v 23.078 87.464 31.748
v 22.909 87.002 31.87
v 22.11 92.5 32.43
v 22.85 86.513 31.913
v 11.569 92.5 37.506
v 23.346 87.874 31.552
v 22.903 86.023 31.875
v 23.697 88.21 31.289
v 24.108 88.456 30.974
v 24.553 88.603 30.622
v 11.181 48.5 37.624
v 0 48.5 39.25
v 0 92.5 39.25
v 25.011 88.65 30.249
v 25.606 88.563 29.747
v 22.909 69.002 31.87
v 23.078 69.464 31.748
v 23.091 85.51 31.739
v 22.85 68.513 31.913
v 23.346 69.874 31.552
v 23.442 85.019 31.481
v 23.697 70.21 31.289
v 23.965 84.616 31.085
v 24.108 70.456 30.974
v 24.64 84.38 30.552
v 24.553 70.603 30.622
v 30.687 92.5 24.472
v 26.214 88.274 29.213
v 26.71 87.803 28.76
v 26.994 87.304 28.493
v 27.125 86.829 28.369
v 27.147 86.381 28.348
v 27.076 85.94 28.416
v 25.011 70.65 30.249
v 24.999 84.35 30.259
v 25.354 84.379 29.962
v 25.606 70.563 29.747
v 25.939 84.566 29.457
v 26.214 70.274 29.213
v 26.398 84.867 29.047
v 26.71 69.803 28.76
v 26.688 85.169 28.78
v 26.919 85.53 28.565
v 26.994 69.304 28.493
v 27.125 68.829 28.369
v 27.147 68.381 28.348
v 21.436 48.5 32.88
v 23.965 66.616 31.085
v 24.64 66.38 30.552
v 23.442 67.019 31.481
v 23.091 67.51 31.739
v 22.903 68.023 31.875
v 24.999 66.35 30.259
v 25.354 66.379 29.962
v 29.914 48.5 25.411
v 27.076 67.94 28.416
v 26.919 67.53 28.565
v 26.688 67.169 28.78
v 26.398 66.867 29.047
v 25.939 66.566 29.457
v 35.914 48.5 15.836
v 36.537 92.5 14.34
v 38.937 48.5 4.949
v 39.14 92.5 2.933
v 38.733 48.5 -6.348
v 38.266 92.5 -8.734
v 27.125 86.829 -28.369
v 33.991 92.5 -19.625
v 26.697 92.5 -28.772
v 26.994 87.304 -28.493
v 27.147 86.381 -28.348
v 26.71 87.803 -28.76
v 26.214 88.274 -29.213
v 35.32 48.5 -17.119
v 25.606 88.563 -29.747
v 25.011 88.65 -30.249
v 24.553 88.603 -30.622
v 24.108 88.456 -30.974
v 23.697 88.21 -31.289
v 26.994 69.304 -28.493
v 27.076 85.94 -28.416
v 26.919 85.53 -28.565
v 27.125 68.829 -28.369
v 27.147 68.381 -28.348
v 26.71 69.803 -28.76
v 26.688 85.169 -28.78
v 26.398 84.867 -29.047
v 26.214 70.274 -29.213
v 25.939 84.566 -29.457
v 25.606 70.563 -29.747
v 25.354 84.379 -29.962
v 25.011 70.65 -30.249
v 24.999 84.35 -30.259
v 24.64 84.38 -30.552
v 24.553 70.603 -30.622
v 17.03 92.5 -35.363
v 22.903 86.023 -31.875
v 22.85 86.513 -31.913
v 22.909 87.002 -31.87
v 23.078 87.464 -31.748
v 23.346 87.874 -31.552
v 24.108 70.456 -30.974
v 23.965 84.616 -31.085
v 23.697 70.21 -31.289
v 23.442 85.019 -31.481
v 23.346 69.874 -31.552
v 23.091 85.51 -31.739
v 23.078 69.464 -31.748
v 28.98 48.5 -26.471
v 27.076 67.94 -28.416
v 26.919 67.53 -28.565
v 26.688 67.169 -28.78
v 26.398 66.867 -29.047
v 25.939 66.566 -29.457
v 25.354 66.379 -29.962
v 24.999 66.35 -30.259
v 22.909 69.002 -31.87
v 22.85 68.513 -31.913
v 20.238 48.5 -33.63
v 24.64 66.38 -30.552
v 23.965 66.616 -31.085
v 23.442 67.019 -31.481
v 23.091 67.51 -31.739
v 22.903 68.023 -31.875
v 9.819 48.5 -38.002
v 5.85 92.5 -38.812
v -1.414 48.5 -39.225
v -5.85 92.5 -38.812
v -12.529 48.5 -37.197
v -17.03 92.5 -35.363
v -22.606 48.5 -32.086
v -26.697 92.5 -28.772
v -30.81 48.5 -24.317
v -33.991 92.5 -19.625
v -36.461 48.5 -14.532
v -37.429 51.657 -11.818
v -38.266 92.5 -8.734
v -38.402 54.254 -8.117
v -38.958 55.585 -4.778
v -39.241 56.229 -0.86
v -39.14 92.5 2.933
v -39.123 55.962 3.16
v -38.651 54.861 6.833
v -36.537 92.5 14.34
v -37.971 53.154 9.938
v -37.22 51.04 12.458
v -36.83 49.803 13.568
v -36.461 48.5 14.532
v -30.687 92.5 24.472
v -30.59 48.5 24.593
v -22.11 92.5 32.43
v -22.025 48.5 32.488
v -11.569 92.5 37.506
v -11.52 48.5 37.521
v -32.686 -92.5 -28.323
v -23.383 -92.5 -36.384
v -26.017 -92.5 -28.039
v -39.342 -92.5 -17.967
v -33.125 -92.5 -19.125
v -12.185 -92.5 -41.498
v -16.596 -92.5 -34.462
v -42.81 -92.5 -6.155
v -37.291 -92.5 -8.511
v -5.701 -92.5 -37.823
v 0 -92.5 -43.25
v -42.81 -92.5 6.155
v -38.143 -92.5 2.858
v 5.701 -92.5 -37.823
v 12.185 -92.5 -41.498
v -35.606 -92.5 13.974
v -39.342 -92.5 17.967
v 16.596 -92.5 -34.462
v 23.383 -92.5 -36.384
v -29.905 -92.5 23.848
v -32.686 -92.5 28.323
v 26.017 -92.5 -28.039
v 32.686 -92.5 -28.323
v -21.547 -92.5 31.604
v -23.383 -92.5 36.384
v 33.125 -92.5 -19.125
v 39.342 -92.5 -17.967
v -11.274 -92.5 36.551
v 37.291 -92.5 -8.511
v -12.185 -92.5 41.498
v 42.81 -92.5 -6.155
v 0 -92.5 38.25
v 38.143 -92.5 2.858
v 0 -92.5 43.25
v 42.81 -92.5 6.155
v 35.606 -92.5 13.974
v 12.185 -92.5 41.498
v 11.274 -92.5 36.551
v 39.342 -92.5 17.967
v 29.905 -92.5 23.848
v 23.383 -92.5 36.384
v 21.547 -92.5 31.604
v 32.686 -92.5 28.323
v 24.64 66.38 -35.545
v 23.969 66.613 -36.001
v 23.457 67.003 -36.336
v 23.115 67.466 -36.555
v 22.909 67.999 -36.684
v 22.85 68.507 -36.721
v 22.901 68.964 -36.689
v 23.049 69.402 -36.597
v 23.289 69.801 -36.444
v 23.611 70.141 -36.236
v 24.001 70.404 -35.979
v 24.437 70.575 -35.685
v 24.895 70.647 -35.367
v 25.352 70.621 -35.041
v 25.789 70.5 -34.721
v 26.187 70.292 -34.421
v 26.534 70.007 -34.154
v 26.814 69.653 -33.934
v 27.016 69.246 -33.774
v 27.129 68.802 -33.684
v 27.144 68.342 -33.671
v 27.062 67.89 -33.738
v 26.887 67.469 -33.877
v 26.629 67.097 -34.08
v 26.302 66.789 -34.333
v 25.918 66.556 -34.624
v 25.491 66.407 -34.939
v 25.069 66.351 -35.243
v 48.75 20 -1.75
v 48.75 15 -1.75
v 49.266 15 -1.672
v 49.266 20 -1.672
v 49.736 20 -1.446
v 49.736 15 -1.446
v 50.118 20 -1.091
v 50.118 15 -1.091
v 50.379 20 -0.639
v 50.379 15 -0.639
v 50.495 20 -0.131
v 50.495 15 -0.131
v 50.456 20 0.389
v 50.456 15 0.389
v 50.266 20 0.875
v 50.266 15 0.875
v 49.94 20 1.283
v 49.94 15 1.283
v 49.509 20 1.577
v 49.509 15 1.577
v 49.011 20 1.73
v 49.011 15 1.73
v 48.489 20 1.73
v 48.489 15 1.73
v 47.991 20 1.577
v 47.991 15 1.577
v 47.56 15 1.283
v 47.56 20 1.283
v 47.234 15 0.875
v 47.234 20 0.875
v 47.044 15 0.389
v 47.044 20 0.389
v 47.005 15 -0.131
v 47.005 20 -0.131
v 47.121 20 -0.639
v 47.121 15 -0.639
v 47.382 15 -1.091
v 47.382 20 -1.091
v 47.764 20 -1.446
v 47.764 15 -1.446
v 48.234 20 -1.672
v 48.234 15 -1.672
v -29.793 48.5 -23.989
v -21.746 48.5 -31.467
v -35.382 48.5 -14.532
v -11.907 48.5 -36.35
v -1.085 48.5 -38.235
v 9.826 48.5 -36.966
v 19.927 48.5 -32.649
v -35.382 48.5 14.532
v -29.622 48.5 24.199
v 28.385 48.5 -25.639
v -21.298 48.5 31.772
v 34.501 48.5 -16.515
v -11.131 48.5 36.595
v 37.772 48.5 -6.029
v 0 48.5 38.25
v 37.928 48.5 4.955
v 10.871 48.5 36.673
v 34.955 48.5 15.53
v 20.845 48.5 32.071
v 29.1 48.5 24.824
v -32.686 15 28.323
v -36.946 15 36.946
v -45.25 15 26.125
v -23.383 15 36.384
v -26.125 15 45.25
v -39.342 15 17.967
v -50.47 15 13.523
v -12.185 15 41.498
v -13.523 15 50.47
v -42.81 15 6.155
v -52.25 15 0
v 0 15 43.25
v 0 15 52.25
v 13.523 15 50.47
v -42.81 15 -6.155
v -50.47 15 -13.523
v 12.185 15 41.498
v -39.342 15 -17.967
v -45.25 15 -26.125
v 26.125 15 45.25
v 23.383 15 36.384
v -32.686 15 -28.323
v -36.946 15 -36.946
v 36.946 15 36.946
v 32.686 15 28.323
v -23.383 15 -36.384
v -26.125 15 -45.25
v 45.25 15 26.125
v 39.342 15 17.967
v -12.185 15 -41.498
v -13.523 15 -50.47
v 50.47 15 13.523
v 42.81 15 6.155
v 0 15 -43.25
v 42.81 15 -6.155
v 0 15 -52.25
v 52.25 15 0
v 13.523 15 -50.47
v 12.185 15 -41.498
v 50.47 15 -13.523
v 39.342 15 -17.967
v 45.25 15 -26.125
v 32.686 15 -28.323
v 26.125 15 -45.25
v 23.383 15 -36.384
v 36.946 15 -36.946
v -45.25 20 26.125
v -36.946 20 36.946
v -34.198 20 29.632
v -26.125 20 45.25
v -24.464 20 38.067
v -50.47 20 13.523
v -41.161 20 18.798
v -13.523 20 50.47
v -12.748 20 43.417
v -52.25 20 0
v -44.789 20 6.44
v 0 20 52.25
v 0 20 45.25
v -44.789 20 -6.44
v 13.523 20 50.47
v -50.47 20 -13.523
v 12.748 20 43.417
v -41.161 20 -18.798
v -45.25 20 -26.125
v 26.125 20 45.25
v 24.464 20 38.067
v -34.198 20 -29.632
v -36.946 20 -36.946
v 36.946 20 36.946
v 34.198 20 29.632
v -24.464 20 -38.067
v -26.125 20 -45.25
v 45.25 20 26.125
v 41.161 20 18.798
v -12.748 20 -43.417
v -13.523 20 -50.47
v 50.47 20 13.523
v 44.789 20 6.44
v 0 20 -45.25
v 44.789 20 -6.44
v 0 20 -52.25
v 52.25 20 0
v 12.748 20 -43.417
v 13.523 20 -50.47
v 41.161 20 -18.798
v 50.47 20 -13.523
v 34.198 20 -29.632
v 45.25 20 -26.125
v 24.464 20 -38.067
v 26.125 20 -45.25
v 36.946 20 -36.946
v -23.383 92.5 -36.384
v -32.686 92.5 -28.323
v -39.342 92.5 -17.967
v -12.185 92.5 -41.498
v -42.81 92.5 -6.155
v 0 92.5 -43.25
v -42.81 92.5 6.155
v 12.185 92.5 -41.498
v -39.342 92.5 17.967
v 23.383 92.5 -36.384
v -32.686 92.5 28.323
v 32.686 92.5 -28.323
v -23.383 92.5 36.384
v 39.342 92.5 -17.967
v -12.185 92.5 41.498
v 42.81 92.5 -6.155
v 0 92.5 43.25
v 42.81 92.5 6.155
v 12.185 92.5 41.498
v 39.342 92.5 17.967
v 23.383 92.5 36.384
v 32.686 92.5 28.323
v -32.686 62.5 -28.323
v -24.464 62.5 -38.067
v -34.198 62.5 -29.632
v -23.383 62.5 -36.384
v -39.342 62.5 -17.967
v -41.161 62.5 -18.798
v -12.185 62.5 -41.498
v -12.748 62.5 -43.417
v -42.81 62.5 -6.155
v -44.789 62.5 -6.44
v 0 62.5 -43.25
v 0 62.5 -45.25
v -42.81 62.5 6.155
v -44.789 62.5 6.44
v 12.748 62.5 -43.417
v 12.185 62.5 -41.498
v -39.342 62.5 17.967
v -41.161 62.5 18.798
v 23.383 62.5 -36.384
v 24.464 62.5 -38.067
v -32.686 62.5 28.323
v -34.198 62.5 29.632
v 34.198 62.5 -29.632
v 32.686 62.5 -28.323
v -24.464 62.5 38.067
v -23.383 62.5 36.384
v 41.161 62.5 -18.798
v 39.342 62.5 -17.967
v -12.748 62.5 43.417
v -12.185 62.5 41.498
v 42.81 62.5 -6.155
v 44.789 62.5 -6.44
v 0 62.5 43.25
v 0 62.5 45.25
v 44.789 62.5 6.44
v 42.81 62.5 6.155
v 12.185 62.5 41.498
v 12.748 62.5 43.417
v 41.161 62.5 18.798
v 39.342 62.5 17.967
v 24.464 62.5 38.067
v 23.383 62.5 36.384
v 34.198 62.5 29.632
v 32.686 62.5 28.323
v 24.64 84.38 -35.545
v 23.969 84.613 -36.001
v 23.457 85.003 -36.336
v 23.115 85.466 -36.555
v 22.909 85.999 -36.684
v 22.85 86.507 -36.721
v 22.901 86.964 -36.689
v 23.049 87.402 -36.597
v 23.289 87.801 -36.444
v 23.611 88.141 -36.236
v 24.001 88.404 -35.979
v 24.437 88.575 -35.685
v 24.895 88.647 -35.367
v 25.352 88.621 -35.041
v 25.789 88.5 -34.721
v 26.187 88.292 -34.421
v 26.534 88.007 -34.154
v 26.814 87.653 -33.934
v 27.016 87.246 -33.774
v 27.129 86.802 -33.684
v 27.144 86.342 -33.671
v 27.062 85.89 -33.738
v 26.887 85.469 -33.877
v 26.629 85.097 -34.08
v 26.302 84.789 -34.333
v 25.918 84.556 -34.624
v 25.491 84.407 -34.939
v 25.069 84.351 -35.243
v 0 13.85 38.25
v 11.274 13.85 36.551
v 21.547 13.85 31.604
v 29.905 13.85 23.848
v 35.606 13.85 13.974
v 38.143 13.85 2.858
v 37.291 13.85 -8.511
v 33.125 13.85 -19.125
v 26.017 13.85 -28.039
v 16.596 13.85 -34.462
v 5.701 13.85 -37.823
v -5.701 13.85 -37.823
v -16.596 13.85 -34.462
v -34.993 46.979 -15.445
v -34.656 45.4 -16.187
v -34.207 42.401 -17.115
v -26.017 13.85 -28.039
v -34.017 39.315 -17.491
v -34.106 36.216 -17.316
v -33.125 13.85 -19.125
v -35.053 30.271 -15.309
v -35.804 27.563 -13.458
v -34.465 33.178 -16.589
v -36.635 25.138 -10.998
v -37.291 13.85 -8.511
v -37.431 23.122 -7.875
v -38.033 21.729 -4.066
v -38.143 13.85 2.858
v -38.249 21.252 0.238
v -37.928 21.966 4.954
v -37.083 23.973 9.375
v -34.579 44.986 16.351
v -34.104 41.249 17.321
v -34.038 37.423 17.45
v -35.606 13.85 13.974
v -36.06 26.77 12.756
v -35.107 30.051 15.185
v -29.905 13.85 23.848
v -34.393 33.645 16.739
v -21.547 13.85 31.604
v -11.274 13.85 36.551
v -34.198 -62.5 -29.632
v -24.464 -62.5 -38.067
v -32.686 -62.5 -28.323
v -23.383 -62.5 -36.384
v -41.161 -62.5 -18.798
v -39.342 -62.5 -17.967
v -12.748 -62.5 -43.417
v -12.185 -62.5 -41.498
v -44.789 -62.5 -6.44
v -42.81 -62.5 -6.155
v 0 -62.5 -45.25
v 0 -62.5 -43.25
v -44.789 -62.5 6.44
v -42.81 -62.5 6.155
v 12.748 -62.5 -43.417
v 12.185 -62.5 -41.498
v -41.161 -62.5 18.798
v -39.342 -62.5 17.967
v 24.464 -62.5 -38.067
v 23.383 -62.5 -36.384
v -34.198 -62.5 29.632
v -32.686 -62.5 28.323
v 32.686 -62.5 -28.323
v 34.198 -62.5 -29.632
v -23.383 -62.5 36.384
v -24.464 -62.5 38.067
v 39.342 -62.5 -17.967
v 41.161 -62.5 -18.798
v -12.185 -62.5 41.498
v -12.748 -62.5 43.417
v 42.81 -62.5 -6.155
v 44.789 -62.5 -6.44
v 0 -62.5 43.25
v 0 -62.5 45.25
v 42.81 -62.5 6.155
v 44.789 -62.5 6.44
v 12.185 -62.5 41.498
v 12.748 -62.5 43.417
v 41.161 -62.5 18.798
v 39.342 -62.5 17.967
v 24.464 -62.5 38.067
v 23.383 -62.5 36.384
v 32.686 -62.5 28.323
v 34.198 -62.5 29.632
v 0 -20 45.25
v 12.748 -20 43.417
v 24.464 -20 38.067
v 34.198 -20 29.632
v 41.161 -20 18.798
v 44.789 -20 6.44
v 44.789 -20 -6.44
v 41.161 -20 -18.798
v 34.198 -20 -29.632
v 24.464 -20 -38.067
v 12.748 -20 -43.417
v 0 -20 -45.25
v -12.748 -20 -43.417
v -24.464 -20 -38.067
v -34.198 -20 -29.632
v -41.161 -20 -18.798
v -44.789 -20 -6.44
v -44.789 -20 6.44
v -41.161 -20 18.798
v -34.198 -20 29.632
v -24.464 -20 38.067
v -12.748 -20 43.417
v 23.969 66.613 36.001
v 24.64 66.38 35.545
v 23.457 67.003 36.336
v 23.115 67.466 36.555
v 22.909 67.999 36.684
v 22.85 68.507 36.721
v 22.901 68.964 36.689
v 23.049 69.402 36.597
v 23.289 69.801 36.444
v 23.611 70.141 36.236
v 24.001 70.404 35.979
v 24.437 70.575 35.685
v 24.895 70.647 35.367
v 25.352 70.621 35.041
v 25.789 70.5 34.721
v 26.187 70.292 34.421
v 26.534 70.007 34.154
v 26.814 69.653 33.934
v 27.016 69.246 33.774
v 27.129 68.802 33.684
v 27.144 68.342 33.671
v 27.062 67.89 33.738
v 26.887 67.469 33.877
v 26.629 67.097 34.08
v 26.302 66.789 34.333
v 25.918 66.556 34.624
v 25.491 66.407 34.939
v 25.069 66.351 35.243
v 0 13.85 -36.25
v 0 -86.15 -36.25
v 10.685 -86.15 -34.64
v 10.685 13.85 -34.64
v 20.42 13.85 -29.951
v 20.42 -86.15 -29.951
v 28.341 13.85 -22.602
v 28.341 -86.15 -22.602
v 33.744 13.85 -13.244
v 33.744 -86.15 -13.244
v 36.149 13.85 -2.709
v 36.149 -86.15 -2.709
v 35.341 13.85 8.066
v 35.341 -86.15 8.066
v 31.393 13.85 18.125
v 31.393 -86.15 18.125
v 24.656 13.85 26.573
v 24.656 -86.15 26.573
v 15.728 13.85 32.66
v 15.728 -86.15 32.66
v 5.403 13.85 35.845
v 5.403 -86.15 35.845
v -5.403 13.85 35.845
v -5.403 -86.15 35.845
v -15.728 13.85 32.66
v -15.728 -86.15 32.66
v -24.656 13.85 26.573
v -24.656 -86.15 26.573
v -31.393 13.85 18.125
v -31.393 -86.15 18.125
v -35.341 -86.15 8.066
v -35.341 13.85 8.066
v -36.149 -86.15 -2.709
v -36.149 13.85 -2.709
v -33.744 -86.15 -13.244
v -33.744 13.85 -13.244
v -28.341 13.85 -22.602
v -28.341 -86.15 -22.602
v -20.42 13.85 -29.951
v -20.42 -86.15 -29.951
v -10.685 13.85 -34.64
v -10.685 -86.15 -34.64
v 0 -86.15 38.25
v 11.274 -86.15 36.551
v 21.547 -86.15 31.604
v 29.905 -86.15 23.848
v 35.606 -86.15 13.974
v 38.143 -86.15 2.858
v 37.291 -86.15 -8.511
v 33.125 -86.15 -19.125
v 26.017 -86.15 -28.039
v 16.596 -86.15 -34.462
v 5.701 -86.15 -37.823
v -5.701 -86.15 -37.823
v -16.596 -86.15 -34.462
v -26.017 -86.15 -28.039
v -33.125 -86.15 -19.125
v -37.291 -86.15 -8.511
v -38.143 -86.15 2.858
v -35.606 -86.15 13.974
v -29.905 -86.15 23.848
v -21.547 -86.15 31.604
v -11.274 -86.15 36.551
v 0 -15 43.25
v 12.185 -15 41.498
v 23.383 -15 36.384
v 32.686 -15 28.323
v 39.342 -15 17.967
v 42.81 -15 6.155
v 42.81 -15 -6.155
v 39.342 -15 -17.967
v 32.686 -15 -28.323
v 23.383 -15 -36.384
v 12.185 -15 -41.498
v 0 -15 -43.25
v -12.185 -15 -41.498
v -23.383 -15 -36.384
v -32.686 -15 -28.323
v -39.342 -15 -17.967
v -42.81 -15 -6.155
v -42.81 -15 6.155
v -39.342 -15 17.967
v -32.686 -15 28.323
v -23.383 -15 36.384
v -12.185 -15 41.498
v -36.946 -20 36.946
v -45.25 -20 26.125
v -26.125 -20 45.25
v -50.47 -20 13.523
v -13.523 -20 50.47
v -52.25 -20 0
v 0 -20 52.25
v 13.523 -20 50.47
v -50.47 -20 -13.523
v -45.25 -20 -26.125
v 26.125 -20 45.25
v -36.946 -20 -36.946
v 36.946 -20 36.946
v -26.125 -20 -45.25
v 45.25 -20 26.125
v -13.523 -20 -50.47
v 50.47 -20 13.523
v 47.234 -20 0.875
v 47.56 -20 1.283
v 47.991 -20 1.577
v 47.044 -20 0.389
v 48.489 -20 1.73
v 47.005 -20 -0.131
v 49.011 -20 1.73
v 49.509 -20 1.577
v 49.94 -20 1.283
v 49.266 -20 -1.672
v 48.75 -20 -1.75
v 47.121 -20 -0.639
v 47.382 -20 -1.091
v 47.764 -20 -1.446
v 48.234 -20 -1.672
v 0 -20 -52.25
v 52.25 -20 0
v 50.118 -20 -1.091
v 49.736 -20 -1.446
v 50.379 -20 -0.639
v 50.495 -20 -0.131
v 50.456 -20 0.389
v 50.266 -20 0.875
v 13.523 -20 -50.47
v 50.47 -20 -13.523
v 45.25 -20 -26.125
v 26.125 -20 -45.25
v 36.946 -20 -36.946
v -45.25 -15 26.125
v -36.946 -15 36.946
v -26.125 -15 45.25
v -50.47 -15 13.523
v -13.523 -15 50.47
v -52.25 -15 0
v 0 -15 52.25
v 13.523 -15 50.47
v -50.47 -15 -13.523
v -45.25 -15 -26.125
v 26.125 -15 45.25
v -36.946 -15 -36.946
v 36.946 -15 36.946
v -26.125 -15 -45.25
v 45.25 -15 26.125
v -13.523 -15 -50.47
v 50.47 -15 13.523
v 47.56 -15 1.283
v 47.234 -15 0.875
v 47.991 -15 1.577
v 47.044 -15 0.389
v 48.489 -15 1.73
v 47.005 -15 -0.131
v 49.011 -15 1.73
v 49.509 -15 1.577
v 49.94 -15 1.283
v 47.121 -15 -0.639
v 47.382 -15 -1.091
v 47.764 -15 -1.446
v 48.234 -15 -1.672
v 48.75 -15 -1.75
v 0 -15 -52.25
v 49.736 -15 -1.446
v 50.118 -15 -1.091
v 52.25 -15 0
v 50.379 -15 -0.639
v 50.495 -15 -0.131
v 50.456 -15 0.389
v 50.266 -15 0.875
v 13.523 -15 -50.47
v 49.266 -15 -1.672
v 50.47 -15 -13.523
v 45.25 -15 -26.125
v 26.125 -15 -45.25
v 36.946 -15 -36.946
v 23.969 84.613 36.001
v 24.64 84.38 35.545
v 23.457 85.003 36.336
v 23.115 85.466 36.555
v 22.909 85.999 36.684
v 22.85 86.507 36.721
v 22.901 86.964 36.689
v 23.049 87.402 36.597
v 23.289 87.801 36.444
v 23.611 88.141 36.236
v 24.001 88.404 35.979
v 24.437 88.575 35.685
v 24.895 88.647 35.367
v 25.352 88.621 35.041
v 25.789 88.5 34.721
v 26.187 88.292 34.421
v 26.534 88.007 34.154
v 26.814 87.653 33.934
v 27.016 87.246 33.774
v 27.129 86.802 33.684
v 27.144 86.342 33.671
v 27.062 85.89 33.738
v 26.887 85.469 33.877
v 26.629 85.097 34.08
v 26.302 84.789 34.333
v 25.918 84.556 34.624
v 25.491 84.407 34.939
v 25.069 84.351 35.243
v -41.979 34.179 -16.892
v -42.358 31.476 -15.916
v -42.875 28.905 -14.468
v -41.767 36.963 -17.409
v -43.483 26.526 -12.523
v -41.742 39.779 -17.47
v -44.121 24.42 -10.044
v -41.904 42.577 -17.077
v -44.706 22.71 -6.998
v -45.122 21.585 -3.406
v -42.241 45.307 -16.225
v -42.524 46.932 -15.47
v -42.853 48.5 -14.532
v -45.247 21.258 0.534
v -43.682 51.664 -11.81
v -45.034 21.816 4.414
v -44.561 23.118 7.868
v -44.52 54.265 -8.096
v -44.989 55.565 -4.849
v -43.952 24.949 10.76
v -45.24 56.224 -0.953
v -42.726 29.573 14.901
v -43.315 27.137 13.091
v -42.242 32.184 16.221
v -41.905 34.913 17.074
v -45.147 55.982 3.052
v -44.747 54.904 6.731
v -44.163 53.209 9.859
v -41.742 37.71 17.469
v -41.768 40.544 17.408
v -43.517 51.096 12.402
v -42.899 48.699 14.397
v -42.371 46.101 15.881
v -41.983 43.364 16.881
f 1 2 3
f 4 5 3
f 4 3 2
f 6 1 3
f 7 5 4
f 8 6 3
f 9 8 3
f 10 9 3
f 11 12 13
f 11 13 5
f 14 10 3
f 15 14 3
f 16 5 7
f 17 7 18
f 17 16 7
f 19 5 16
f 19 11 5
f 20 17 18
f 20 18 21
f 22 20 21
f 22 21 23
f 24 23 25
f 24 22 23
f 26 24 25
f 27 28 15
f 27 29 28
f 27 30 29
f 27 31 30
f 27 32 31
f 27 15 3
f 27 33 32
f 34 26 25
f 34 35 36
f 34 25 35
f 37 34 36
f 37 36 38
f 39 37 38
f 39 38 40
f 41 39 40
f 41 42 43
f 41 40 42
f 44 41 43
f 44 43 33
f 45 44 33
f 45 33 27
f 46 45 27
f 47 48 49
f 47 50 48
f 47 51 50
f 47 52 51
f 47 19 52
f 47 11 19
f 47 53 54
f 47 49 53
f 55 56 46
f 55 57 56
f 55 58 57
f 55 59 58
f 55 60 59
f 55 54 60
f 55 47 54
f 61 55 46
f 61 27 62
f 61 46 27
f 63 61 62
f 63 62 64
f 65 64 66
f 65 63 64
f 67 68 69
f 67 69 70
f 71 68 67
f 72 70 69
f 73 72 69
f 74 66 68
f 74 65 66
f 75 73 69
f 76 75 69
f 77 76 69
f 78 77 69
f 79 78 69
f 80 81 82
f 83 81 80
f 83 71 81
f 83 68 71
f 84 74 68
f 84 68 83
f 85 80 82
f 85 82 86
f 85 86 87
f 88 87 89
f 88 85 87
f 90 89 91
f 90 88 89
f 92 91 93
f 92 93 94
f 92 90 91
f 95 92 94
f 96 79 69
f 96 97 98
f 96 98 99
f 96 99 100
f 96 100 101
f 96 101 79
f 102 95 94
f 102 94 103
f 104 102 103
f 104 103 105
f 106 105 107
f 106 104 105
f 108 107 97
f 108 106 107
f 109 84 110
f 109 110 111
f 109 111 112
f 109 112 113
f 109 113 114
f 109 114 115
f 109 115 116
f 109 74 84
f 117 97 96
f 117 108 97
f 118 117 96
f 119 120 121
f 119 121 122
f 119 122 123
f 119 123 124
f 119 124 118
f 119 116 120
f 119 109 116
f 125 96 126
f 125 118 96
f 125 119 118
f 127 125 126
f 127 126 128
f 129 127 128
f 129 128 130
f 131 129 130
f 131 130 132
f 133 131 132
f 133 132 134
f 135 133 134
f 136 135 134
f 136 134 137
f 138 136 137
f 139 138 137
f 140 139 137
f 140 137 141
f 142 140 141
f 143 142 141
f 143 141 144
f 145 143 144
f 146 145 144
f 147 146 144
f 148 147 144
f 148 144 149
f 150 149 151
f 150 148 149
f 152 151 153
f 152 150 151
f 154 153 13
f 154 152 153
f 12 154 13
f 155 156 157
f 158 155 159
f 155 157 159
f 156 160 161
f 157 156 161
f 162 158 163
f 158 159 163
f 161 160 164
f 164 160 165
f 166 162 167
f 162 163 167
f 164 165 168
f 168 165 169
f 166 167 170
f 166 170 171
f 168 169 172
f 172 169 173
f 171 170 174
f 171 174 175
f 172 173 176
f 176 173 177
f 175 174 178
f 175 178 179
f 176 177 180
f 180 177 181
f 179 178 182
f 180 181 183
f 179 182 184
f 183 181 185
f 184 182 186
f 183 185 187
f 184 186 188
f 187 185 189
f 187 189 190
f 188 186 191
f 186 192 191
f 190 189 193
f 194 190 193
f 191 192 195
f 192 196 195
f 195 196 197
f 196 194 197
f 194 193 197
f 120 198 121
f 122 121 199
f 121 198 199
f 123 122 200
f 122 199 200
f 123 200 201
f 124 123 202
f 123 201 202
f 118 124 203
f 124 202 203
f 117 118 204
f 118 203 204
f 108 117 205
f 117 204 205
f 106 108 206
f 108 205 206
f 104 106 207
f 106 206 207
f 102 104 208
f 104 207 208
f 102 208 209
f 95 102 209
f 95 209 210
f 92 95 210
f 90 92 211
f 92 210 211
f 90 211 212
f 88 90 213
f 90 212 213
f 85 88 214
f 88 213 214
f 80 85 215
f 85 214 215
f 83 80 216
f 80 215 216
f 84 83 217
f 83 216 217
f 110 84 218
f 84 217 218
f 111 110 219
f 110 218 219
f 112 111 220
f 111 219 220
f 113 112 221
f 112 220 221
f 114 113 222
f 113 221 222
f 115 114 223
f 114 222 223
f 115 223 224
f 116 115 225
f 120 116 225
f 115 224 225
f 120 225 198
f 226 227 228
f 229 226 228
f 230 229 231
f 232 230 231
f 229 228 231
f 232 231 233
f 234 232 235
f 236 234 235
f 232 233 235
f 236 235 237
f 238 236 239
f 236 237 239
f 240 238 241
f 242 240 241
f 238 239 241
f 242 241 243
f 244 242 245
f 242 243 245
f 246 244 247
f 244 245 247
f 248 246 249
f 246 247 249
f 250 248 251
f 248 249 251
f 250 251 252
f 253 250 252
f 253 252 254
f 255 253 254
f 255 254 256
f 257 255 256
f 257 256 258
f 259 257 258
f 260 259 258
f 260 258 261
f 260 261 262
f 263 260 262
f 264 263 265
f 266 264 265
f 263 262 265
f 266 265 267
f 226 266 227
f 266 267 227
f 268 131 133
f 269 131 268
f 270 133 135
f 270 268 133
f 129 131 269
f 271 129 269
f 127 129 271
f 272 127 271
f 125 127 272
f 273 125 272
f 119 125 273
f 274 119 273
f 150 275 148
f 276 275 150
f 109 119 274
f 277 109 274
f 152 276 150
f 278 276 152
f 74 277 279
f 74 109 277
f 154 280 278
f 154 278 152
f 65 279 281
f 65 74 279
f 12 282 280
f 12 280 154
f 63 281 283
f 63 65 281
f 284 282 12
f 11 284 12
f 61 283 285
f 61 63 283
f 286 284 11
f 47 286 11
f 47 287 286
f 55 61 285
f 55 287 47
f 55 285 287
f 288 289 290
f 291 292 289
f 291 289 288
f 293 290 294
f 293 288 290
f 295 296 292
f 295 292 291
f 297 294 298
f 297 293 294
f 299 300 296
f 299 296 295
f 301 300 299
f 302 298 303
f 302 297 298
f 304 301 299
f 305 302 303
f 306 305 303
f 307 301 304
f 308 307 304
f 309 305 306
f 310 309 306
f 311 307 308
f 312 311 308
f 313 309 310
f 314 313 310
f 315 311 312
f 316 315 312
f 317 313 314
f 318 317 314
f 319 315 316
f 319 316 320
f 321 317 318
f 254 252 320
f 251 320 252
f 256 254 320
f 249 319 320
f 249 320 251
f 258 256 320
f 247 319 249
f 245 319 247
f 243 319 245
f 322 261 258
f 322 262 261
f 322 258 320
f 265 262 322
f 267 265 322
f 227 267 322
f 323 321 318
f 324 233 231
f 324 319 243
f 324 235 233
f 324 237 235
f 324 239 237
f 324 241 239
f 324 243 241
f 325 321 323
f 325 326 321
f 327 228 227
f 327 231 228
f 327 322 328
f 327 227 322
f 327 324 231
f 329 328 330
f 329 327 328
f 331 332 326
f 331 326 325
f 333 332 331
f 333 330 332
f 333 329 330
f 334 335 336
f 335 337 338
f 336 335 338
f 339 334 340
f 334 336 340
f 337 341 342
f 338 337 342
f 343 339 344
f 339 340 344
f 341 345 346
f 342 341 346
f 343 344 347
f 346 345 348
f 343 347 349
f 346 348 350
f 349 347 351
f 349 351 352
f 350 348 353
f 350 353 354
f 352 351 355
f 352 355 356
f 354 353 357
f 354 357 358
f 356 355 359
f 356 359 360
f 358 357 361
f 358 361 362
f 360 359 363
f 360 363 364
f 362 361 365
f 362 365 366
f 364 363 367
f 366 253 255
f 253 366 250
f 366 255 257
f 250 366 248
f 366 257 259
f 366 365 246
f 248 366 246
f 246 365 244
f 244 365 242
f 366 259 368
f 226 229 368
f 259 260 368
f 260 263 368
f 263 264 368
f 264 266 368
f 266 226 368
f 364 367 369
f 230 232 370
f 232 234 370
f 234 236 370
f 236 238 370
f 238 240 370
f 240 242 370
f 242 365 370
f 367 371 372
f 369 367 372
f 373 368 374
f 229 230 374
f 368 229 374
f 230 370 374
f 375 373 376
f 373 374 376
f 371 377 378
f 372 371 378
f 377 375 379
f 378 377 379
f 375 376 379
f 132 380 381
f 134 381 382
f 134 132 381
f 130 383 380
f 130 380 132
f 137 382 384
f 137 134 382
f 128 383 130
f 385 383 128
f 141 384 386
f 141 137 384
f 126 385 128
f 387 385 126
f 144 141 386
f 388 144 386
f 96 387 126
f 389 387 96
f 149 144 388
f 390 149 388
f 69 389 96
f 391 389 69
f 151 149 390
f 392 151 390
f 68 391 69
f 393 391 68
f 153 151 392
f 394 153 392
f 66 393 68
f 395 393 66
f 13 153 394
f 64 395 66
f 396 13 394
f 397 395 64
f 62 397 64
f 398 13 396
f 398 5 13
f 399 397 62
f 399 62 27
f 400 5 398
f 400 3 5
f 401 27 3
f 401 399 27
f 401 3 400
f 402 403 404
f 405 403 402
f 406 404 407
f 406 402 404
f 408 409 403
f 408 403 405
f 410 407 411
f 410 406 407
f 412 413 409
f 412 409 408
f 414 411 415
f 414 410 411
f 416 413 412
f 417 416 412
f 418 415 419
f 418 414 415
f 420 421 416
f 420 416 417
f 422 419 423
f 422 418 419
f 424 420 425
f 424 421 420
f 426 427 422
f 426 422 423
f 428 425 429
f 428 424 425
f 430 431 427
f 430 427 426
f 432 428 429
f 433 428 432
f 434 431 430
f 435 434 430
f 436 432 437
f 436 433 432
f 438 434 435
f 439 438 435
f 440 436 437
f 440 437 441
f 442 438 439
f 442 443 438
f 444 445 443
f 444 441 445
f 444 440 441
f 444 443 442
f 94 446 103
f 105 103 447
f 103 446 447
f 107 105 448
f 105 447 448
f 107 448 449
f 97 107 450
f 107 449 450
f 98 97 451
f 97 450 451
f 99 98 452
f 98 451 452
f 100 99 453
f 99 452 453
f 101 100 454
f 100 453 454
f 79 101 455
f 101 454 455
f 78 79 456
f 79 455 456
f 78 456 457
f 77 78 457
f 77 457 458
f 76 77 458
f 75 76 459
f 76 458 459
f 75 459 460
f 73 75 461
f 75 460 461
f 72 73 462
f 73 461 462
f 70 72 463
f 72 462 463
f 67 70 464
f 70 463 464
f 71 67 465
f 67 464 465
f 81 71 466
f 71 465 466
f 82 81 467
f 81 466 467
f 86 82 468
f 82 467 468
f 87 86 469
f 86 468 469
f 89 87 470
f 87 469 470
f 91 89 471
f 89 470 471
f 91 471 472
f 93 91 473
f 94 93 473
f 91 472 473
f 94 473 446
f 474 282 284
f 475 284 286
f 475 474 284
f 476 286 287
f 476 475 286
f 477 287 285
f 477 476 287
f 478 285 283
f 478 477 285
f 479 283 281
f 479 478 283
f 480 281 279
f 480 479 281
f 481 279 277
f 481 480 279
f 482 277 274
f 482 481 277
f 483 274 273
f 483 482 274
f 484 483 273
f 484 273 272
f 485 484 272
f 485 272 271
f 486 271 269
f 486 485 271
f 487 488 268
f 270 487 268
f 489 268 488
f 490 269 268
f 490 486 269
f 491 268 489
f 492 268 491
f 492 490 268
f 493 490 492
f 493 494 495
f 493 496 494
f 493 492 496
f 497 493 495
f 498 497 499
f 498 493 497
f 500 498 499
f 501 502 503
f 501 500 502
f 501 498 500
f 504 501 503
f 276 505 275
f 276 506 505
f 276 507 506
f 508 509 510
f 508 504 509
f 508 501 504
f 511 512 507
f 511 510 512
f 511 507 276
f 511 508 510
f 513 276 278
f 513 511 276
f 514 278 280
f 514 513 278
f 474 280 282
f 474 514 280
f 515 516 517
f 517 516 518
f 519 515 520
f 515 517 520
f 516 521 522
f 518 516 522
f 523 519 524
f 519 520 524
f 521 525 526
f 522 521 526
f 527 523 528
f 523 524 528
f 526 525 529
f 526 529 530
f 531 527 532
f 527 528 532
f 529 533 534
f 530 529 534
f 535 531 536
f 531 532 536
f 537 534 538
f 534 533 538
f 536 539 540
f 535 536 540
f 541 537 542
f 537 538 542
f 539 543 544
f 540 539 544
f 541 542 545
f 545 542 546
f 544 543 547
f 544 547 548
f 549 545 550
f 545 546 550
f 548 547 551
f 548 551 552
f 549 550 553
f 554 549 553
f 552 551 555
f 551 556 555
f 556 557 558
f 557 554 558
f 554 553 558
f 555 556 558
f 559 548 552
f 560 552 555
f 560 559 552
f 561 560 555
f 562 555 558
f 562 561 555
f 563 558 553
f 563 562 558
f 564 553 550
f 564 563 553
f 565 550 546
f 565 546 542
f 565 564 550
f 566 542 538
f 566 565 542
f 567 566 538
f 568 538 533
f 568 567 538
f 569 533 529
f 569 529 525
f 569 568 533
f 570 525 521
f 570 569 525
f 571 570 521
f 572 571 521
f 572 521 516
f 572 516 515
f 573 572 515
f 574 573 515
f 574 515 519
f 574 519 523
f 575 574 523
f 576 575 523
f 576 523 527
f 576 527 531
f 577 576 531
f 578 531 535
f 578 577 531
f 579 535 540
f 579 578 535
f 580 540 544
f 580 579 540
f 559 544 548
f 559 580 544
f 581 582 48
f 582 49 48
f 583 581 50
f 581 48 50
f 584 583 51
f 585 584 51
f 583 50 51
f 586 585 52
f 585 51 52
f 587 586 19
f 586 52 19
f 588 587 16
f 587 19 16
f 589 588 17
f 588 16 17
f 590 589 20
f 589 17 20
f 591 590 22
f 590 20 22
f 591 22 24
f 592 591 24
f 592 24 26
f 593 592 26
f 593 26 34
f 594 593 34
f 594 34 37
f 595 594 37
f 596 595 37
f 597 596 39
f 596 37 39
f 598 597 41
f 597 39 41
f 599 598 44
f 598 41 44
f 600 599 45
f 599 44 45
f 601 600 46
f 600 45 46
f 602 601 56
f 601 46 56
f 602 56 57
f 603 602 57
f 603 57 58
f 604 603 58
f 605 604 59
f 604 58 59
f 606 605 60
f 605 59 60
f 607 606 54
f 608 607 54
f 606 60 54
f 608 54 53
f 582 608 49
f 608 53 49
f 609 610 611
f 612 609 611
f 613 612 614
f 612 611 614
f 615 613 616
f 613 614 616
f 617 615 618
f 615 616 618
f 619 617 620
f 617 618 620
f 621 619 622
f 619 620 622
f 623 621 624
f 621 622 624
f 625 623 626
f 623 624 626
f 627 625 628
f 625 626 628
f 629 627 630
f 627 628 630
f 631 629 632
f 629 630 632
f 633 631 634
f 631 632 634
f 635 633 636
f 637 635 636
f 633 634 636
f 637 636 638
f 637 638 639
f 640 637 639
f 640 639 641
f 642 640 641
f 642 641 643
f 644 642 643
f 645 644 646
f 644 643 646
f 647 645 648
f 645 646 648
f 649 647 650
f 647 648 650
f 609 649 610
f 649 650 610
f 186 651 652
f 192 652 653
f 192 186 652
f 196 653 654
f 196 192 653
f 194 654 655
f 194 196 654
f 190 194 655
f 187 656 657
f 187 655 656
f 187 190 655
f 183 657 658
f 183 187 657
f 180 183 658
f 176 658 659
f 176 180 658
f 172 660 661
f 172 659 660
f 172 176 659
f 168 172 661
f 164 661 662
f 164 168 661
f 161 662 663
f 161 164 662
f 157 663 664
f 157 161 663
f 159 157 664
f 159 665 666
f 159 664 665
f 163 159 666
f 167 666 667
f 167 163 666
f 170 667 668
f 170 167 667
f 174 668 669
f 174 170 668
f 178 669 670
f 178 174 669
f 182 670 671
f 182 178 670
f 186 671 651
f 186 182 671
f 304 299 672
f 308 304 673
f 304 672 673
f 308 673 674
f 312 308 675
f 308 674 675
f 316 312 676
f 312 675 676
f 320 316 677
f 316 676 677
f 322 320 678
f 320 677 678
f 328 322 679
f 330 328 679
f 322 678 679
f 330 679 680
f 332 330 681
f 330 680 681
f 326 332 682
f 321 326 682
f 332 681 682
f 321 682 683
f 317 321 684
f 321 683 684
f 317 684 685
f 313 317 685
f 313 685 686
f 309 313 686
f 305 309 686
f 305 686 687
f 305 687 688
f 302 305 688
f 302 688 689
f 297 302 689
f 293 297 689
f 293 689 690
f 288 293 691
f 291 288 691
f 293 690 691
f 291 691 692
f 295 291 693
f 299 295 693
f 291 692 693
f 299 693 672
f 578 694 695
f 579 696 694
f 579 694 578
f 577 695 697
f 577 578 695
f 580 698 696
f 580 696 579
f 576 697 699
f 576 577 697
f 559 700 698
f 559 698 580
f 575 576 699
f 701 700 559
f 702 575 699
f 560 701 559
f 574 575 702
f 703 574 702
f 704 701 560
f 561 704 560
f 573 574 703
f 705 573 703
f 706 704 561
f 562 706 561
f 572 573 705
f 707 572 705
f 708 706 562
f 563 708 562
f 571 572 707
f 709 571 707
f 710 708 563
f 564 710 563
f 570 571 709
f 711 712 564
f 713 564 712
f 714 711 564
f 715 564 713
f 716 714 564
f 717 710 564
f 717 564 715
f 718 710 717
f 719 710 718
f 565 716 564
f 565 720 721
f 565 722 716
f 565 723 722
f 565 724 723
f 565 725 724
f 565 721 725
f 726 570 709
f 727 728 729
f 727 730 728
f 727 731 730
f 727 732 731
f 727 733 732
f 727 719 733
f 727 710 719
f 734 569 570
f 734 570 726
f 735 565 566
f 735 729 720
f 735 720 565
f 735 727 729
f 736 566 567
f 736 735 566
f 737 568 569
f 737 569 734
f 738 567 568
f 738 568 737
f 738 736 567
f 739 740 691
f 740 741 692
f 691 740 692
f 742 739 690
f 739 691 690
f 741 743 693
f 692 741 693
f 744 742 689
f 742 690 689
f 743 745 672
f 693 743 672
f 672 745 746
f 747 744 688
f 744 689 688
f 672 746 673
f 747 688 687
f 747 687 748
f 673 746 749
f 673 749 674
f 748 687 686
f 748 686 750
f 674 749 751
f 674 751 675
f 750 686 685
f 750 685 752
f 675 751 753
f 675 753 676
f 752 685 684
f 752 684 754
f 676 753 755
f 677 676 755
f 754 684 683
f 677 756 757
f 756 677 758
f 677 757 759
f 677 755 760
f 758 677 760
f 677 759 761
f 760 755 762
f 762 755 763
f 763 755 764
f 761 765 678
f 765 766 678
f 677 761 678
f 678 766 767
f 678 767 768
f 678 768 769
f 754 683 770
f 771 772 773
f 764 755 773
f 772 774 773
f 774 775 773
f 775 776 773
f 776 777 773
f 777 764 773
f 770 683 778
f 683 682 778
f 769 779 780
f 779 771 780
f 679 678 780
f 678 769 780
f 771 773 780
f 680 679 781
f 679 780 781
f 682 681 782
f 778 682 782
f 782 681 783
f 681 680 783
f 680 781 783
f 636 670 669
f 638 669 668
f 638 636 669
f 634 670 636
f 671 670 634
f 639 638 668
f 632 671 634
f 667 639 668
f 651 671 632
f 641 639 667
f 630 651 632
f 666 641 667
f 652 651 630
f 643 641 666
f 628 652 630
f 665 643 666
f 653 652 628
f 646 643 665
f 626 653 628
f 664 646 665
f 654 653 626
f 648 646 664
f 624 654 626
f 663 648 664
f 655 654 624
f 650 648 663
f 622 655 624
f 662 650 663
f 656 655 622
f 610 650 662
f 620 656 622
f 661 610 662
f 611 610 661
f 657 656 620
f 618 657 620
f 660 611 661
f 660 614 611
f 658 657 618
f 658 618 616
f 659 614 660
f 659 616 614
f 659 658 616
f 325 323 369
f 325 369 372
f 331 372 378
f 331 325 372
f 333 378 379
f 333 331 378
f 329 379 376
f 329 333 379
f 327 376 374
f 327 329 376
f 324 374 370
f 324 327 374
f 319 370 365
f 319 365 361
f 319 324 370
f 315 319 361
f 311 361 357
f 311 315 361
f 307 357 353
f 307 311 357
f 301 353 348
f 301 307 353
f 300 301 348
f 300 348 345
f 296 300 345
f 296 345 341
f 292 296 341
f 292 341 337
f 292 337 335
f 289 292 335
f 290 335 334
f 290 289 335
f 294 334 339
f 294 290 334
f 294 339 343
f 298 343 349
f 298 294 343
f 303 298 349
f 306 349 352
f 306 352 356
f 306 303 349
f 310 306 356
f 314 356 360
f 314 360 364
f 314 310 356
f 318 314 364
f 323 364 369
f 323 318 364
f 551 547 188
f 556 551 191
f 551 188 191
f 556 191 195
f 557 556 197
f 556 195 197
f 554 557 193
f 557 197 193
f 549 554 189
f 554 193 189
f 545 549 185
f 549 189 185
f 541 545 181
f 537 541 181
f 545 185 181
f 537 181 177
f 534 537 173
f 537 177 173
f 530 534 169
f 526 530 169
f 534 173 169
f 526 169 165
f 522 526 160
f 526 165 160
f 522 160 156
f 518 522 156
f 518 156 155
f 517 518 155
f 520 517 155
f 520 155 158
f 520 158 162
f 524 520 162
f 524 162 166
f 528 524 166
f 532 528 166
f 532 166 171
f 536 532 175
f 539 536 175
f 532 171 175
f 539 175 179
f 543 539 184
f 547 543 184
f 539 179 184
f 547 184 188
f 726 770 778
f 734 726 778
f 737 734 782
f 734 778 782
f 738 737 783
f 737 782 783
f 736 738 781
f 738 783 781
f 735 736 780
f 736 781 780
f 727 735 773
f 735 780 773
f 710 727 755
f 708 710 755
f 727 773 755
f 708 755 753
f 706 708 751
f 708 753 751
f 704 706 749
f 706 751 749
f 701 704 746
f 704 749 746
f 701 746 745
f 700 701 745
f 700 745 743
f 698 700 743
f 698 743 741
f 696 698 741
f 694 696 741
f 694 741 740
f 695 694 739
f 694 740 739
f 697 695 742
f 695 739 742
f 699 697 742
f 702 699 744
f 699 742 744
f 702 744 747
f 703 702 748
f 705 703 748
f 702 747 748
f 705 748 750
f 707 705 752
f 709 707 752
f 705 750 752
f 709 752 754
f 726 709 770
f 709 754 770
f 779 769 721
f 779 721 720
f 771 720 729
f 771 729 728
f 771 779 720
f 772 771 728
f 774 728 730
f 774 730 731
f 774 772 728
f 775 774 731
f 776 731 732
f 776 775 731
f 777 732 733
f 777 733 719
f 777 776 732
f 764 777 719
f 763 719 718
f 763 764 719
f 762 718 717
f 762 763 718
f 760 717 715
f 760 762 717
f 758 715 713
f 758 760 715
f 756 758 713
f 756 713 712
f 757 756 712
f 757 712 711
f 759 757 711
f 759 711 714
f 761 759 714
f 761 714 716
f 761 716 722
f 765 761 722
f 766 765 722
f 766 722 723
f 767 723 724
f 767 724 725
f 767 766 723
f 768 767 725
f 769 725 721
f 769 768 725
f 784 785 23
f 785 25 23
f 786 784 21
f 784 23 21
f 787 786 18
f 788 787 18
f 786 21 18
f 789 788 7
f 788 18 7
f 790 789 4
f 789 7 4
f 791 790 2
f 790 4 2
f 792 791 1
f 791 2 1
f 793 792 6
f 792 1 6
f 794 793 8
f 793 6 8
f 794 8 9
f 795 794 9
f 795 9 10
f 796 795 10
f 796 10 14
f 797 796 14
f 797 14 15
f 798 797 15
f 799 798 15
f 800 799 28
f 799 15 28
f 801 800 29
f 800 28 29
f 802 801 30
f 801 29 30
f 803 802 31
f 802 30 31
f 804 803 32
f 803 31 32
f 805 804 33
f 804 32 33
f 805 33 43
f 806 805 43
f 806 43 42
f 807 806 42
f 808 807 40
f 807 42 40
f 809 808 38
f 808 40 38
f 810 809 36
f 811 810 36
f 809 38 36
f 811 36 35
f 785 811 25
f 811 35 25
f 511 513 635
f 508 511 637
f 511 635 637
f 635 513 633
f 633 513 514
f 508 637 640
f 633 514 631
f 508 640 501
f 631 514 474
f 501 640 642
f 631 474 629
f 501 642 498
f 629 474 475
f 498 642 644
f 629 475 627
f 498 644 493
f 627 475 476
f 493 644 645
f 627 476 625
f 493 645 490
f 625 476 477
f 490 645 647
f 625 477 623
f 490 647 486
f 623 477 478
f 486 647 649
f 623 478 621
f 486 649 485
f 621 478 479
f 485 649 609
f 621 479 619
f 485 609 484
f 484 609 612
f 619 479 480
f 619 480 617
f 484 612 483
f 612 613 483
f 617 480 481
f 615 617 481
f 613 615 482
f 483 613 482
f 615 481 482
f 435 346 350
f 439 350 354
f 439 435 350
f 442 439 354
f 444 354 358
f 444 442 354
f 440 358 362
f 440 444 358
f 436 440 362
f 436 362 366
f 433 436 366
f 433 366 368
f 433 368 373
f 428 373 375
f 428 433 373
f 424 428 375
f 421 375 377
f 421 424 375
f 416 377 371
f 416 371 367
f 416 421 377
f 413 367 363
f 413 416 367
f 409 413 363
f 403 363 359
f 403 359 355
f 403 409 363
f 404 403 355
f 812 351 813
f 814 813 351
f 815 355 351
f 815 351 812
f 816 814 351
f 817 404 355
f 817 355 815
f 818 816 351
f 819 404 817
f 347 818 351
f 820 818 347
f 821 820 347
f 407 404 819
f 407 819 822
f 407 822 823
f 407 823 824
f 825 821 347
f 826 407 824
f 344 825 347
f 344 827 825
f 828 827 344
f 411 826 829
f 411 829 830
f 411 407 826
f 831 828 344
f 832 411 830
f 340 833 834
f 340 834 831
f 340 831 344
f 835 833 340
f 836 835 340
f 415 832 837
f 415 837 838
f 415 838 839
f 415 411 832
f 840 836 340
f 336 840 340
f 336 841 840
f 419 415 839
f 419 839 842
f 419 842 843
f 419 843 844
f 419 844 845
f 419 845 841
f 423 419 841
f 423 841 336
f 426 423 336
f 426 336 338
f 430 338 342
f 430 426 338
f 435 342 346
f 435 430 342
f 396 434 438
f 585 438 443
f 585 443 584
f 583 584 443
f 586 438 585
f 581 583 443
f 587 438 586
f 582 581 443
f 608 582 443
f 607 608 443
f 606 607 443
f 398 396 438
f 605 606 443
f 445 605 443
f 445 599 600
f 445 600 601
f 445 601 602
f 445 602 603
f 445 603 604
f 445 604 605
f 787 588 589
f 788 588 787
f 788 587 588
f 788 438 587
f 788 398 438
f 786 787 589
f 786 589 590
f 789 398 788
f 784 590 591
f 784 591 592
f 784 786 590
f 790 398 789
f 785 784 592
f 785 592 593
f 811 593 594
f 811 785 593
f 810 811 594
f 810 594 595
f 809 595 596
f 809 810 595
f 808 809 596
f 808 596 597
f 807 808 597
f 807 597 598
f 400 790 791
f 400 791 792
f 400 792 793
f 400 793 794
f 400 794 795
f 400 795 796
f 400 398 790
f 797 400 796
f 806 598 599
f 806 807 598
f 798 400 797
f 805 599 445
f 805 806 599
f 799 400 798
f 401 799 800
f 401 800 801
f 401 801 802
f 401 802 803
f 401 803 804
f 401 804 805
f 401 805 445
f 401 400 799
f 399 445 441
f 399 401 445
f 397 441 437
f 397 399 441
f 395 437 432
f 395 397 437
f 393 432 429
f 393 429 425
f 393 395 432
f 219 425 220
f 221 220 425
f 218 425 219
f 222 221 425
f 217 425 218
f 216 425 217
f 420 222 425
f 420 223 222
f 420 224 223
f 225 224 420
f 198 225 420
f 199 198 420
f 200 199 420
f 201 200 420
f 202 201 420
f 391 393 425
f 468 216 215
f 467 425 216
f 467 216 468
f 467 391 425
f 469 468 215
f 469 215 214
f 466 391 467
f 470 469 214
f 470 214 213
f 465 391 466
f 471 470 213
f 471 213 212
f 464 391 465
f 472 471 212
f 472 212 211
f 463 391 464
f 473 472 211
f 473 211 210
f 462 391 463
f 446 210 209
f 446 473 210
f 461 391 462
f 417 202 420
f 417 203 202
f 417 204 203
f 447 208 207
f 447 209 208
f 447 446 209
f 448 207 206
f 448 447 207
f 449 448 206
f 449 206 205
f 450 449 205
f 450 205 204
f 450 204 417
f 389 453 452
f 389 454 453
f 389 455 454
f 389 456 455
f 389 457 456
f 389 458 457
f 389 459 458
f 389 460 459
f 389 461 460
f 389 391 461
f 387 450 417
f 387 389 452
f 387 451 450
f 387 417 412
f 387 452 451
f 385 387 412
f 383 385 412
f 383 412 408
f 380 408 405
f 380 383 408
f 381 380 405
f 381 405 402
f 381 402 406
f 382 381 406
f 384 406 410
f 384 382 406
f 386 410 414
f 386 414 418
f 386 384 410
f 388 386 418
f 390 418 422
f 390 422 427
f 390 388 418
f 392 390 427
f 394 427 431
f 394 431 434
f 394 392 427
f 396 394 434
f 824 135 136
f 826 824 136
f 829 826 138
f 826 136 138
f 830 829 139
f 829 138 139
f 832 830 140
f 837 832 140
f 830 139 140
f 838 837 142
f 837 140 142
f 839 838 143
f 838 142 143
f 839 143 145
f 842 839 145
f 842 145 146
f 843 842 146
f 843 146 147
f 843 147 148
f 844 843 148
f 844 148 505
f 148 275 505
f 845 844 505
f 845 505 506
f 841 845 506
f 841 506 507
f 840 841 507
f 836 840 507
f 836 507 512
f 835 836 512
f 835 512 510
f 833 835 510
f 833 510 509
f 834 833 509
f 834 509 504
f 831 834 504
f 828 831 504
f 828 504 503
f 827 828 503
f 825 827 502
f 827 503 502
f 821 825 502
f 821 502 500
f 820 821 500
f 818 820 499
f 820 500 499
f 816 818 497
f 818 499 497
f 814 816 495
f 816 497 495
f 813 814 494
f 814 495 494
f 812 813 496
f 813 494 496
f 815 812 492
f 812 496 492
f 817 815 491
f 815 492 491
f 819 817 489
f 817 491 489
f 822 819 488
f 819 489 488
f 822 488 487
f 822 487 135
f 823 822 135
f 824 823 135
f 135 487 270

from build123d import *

# Parameters (mm, degrees)
SKETCH1_R                      = 45.25
SKETCH1_R_2                    = 38.25
BOSS_EXTRUDE1_DEPTH            = 92.5
BOSS_EXTRUDE2_START            = -6.35
SKETCH2_R                      = 38.25
SKETCH2_R_2                    = 36.25
BOSS_EXTRUDE2_DEPTH            = 100
CUT_EXTRUDE3_START             = -44
SKETCH6_R                      = 39.25
SKETCH6_R_2                    = 38.25
CUT_EXTRUDE3_DEPTH             = 44
SKETCH7_R                      = 17.5
CUT_EXTRUDE4_DEPTH             = 113.478331247
SKETCH8_R                      = 45.25
SKETCH8_R_2                    = 43.25
CUT_EXTRUDE5_DEPTH             = 30
SKETCH9_R                      = 45.25
SKETCH9_R_2                    = 43.25
CUT_EXTRUDE6_DEPTH             = 15
SKETCH10_R                     = 52.25
SKETCH10_R_2                   = 43.25
SKETCH10_R_3                   = 1.75
BOSS_EXTRUDE3_DEPTH            = 5
CBORE_FOR_M4_SHCS1_D           = 4.3
CBORE_FOR_M4_SHCS1_DEPTH       = 100.101198794
CBORE_FOR_M4_SHCS1_CBORE_D     = 8
CBORE_FOR_M4_SHCS1_CBORE_DEPTH = 4
CBORE_FOR_M4_SHCS1_TIP         = 1.291850331


with BuildPart() as part:
    # Sketch1 → Boss-Extrude1 (new, symmetric)
    with BuildSketch(Plane(origin=(0, 0, 0), x_dir=(1, 0, 0), z_dir=(0, 1, 0))):
        with Locations(Location((0, 0, 0), (0, 0, 270))):
            Circle(SKETCH1_R)
        with Locations(Location((0, 0, 0), (0, 0, 270))):
            Circle(SKETCH1_R_2, mode=Mode.SUBTRACT)
    extrude(amount=BOSS_EXTRUDE1_DEPTH, both=True)

    # Sketch2 → Boss-Extrude2 (add)
    with BuildSketch(Plane.XZ.offset(92.5).offset(BOSS_EXTRUDE2_START)):
        with Locations(Location((0, 0, 0), (0, 0, 270))):
            Circle(SKETCH2_R)
        with Locations(Location((0, 0, 0), (0, 0, 270))):
            Circle(SKETCH2_R_2, mode=Mode.SUBTRACT)
    extrude(amount=-BOSS_EXTRUDE2_DEPTH)

    # Sketch6 → Cut-Extrude3 (cut)
    with BuildSketch(Plane(origin=(0, 92.5, 0), x_dir=(1, 0, 0), z_dir=(0, 1, 0)).offset(CUT_EXTRUDE3_START)):
        with Locations(Location((0, 0, 0), (0, 0, 270))):
            Circle(SKETCH6_R)
        with Locations(Location((0, 0, 0), (0, 0, 90))):
            Circle(SKETCH6_R_2, mode=Mode.SUBTRACT)
    extrude(amount=CUT_EXTRUDE3_DEPTH, mode=Mode.SUBTRACT)

    # Sketch7 → Cut-Extrude4 (cut, through all)
    with BuildSketch(Plane(origin=(0, 0, 0), x_dir=(0, 0, -1), z_dir=(1, 0, 0))):
        with Locations(Location((0, 38.75, 0), (0, 0, 33.858436659))):
            Circle(SKETCH7_R)
    extrude(amount=-CUT_EXTRUDE4_DEPTH, mode=Mode.SUBTRACT)

    # Sketch8 → Cut-Extrude5 (cut)
    with BuildSketch(Plane(origin=(0, 92.5, 0), x_dir=(1, 0, 0), z_dir=(0, 1, 0))):
        with Locations(Location((0, 0, 0), (0, 0, 270))):
            Circle(SKETCH8_R)
        with Locations(Location((0, 0, 0), (0, 0, 270))):
            Circle(SKETCH8_R_2, mode=Mode.SUBTRACT)
    cut_extrude5 = extrude(amount=-CUT_EXTRUDE5_DEPTH, mode=Mode.SUBTRACT)

    # Mirror1: Cut-Extrude5 across plane
    add(cut_extrude5.mirror(Plane.ZX), mode=Mode.SUBTRACT)

    # Sketch9 → Cut-Extrude6 (cut, symmetric)
    with BuildSketch(Plane(origin=(0, 0, 0), x_dir=(1, 0, 0), z_dir=(0, 1, 0))):
        with Locations(Location((0, 0, 0), (0, 0, 270))):
            Circle(SKETCH9_R)
        with Locations(Location((0, 0, 0), (0, 0, 270))):
            Circle(SKETCH9_R_2, mode=Mode.SUBTRACT)
    extrude(amount=CUT_EXTRUDE6_DEPTH, both=True, mode=Mode.SUBTRACT)

    # Sketch10 → Boss-Extrude3 (add)
    with BuildSketch(Plane(origin=(0, 15, 0), x_dir=(-1, 0, 0), z_dir=(0, -1, 0))):
        with Locations(Location((0, 0, 0), (0, 0, 90))):
            Circle(SKETCH10_R)
        with Locations(Location((0, 0, 0), (0, 0, 270))):
            Circle(SKETCH10_R_2, mode=Mode.SUBTRACT)
        with Locations(Location((-48.75, 0, 0), (0, 0, 90))):
            Circle(SKETCH10_R_3, mode=Mode.SUBTRACT)
    boss_extrude3 = extrude(amount=-BOSS_EXTRUDE3_DEPTH)

    # Mirror2: Boss-Extrude3 across plane
    add(boss_extrude3.mirror(Plane.ZX))

    # CBORE for M4 SHCS1
    with Locations(Plane(origin=(401.677021233, -407.224238547, 50.050599397), x_dir=(0.16757219303491572, 0.985859807539322, 0), z_dir=(0, 0, 1))):
        with Locations((405.876811742, 451.068889591), (423.622288278, 454.085189065)):
            CounterBoreHole(CBORE_FOR_M4_SHCS1_D / 2, CBORE_FOR_M4_SHCS1_CBORE_D / 2, CBORE_FOR_M4_SHCS1_CBORE_DEPTH, depth=CBORE_FOR_M4_SHCS1_DEPTH)
            with Locations((0, 0, -(CBORE_FOR_M4_SHCS1_DEPTH + CBORE_FOR_M4_SHCS1_TIP / 2))):  # 118° drill point
                Cone(0, CBORE_FOR_M4_SHCS1_D / 2, CBORE_FOR_M4_SHCS1_TIP, mode=Mode.SUBTRACT)


solid = part.part
